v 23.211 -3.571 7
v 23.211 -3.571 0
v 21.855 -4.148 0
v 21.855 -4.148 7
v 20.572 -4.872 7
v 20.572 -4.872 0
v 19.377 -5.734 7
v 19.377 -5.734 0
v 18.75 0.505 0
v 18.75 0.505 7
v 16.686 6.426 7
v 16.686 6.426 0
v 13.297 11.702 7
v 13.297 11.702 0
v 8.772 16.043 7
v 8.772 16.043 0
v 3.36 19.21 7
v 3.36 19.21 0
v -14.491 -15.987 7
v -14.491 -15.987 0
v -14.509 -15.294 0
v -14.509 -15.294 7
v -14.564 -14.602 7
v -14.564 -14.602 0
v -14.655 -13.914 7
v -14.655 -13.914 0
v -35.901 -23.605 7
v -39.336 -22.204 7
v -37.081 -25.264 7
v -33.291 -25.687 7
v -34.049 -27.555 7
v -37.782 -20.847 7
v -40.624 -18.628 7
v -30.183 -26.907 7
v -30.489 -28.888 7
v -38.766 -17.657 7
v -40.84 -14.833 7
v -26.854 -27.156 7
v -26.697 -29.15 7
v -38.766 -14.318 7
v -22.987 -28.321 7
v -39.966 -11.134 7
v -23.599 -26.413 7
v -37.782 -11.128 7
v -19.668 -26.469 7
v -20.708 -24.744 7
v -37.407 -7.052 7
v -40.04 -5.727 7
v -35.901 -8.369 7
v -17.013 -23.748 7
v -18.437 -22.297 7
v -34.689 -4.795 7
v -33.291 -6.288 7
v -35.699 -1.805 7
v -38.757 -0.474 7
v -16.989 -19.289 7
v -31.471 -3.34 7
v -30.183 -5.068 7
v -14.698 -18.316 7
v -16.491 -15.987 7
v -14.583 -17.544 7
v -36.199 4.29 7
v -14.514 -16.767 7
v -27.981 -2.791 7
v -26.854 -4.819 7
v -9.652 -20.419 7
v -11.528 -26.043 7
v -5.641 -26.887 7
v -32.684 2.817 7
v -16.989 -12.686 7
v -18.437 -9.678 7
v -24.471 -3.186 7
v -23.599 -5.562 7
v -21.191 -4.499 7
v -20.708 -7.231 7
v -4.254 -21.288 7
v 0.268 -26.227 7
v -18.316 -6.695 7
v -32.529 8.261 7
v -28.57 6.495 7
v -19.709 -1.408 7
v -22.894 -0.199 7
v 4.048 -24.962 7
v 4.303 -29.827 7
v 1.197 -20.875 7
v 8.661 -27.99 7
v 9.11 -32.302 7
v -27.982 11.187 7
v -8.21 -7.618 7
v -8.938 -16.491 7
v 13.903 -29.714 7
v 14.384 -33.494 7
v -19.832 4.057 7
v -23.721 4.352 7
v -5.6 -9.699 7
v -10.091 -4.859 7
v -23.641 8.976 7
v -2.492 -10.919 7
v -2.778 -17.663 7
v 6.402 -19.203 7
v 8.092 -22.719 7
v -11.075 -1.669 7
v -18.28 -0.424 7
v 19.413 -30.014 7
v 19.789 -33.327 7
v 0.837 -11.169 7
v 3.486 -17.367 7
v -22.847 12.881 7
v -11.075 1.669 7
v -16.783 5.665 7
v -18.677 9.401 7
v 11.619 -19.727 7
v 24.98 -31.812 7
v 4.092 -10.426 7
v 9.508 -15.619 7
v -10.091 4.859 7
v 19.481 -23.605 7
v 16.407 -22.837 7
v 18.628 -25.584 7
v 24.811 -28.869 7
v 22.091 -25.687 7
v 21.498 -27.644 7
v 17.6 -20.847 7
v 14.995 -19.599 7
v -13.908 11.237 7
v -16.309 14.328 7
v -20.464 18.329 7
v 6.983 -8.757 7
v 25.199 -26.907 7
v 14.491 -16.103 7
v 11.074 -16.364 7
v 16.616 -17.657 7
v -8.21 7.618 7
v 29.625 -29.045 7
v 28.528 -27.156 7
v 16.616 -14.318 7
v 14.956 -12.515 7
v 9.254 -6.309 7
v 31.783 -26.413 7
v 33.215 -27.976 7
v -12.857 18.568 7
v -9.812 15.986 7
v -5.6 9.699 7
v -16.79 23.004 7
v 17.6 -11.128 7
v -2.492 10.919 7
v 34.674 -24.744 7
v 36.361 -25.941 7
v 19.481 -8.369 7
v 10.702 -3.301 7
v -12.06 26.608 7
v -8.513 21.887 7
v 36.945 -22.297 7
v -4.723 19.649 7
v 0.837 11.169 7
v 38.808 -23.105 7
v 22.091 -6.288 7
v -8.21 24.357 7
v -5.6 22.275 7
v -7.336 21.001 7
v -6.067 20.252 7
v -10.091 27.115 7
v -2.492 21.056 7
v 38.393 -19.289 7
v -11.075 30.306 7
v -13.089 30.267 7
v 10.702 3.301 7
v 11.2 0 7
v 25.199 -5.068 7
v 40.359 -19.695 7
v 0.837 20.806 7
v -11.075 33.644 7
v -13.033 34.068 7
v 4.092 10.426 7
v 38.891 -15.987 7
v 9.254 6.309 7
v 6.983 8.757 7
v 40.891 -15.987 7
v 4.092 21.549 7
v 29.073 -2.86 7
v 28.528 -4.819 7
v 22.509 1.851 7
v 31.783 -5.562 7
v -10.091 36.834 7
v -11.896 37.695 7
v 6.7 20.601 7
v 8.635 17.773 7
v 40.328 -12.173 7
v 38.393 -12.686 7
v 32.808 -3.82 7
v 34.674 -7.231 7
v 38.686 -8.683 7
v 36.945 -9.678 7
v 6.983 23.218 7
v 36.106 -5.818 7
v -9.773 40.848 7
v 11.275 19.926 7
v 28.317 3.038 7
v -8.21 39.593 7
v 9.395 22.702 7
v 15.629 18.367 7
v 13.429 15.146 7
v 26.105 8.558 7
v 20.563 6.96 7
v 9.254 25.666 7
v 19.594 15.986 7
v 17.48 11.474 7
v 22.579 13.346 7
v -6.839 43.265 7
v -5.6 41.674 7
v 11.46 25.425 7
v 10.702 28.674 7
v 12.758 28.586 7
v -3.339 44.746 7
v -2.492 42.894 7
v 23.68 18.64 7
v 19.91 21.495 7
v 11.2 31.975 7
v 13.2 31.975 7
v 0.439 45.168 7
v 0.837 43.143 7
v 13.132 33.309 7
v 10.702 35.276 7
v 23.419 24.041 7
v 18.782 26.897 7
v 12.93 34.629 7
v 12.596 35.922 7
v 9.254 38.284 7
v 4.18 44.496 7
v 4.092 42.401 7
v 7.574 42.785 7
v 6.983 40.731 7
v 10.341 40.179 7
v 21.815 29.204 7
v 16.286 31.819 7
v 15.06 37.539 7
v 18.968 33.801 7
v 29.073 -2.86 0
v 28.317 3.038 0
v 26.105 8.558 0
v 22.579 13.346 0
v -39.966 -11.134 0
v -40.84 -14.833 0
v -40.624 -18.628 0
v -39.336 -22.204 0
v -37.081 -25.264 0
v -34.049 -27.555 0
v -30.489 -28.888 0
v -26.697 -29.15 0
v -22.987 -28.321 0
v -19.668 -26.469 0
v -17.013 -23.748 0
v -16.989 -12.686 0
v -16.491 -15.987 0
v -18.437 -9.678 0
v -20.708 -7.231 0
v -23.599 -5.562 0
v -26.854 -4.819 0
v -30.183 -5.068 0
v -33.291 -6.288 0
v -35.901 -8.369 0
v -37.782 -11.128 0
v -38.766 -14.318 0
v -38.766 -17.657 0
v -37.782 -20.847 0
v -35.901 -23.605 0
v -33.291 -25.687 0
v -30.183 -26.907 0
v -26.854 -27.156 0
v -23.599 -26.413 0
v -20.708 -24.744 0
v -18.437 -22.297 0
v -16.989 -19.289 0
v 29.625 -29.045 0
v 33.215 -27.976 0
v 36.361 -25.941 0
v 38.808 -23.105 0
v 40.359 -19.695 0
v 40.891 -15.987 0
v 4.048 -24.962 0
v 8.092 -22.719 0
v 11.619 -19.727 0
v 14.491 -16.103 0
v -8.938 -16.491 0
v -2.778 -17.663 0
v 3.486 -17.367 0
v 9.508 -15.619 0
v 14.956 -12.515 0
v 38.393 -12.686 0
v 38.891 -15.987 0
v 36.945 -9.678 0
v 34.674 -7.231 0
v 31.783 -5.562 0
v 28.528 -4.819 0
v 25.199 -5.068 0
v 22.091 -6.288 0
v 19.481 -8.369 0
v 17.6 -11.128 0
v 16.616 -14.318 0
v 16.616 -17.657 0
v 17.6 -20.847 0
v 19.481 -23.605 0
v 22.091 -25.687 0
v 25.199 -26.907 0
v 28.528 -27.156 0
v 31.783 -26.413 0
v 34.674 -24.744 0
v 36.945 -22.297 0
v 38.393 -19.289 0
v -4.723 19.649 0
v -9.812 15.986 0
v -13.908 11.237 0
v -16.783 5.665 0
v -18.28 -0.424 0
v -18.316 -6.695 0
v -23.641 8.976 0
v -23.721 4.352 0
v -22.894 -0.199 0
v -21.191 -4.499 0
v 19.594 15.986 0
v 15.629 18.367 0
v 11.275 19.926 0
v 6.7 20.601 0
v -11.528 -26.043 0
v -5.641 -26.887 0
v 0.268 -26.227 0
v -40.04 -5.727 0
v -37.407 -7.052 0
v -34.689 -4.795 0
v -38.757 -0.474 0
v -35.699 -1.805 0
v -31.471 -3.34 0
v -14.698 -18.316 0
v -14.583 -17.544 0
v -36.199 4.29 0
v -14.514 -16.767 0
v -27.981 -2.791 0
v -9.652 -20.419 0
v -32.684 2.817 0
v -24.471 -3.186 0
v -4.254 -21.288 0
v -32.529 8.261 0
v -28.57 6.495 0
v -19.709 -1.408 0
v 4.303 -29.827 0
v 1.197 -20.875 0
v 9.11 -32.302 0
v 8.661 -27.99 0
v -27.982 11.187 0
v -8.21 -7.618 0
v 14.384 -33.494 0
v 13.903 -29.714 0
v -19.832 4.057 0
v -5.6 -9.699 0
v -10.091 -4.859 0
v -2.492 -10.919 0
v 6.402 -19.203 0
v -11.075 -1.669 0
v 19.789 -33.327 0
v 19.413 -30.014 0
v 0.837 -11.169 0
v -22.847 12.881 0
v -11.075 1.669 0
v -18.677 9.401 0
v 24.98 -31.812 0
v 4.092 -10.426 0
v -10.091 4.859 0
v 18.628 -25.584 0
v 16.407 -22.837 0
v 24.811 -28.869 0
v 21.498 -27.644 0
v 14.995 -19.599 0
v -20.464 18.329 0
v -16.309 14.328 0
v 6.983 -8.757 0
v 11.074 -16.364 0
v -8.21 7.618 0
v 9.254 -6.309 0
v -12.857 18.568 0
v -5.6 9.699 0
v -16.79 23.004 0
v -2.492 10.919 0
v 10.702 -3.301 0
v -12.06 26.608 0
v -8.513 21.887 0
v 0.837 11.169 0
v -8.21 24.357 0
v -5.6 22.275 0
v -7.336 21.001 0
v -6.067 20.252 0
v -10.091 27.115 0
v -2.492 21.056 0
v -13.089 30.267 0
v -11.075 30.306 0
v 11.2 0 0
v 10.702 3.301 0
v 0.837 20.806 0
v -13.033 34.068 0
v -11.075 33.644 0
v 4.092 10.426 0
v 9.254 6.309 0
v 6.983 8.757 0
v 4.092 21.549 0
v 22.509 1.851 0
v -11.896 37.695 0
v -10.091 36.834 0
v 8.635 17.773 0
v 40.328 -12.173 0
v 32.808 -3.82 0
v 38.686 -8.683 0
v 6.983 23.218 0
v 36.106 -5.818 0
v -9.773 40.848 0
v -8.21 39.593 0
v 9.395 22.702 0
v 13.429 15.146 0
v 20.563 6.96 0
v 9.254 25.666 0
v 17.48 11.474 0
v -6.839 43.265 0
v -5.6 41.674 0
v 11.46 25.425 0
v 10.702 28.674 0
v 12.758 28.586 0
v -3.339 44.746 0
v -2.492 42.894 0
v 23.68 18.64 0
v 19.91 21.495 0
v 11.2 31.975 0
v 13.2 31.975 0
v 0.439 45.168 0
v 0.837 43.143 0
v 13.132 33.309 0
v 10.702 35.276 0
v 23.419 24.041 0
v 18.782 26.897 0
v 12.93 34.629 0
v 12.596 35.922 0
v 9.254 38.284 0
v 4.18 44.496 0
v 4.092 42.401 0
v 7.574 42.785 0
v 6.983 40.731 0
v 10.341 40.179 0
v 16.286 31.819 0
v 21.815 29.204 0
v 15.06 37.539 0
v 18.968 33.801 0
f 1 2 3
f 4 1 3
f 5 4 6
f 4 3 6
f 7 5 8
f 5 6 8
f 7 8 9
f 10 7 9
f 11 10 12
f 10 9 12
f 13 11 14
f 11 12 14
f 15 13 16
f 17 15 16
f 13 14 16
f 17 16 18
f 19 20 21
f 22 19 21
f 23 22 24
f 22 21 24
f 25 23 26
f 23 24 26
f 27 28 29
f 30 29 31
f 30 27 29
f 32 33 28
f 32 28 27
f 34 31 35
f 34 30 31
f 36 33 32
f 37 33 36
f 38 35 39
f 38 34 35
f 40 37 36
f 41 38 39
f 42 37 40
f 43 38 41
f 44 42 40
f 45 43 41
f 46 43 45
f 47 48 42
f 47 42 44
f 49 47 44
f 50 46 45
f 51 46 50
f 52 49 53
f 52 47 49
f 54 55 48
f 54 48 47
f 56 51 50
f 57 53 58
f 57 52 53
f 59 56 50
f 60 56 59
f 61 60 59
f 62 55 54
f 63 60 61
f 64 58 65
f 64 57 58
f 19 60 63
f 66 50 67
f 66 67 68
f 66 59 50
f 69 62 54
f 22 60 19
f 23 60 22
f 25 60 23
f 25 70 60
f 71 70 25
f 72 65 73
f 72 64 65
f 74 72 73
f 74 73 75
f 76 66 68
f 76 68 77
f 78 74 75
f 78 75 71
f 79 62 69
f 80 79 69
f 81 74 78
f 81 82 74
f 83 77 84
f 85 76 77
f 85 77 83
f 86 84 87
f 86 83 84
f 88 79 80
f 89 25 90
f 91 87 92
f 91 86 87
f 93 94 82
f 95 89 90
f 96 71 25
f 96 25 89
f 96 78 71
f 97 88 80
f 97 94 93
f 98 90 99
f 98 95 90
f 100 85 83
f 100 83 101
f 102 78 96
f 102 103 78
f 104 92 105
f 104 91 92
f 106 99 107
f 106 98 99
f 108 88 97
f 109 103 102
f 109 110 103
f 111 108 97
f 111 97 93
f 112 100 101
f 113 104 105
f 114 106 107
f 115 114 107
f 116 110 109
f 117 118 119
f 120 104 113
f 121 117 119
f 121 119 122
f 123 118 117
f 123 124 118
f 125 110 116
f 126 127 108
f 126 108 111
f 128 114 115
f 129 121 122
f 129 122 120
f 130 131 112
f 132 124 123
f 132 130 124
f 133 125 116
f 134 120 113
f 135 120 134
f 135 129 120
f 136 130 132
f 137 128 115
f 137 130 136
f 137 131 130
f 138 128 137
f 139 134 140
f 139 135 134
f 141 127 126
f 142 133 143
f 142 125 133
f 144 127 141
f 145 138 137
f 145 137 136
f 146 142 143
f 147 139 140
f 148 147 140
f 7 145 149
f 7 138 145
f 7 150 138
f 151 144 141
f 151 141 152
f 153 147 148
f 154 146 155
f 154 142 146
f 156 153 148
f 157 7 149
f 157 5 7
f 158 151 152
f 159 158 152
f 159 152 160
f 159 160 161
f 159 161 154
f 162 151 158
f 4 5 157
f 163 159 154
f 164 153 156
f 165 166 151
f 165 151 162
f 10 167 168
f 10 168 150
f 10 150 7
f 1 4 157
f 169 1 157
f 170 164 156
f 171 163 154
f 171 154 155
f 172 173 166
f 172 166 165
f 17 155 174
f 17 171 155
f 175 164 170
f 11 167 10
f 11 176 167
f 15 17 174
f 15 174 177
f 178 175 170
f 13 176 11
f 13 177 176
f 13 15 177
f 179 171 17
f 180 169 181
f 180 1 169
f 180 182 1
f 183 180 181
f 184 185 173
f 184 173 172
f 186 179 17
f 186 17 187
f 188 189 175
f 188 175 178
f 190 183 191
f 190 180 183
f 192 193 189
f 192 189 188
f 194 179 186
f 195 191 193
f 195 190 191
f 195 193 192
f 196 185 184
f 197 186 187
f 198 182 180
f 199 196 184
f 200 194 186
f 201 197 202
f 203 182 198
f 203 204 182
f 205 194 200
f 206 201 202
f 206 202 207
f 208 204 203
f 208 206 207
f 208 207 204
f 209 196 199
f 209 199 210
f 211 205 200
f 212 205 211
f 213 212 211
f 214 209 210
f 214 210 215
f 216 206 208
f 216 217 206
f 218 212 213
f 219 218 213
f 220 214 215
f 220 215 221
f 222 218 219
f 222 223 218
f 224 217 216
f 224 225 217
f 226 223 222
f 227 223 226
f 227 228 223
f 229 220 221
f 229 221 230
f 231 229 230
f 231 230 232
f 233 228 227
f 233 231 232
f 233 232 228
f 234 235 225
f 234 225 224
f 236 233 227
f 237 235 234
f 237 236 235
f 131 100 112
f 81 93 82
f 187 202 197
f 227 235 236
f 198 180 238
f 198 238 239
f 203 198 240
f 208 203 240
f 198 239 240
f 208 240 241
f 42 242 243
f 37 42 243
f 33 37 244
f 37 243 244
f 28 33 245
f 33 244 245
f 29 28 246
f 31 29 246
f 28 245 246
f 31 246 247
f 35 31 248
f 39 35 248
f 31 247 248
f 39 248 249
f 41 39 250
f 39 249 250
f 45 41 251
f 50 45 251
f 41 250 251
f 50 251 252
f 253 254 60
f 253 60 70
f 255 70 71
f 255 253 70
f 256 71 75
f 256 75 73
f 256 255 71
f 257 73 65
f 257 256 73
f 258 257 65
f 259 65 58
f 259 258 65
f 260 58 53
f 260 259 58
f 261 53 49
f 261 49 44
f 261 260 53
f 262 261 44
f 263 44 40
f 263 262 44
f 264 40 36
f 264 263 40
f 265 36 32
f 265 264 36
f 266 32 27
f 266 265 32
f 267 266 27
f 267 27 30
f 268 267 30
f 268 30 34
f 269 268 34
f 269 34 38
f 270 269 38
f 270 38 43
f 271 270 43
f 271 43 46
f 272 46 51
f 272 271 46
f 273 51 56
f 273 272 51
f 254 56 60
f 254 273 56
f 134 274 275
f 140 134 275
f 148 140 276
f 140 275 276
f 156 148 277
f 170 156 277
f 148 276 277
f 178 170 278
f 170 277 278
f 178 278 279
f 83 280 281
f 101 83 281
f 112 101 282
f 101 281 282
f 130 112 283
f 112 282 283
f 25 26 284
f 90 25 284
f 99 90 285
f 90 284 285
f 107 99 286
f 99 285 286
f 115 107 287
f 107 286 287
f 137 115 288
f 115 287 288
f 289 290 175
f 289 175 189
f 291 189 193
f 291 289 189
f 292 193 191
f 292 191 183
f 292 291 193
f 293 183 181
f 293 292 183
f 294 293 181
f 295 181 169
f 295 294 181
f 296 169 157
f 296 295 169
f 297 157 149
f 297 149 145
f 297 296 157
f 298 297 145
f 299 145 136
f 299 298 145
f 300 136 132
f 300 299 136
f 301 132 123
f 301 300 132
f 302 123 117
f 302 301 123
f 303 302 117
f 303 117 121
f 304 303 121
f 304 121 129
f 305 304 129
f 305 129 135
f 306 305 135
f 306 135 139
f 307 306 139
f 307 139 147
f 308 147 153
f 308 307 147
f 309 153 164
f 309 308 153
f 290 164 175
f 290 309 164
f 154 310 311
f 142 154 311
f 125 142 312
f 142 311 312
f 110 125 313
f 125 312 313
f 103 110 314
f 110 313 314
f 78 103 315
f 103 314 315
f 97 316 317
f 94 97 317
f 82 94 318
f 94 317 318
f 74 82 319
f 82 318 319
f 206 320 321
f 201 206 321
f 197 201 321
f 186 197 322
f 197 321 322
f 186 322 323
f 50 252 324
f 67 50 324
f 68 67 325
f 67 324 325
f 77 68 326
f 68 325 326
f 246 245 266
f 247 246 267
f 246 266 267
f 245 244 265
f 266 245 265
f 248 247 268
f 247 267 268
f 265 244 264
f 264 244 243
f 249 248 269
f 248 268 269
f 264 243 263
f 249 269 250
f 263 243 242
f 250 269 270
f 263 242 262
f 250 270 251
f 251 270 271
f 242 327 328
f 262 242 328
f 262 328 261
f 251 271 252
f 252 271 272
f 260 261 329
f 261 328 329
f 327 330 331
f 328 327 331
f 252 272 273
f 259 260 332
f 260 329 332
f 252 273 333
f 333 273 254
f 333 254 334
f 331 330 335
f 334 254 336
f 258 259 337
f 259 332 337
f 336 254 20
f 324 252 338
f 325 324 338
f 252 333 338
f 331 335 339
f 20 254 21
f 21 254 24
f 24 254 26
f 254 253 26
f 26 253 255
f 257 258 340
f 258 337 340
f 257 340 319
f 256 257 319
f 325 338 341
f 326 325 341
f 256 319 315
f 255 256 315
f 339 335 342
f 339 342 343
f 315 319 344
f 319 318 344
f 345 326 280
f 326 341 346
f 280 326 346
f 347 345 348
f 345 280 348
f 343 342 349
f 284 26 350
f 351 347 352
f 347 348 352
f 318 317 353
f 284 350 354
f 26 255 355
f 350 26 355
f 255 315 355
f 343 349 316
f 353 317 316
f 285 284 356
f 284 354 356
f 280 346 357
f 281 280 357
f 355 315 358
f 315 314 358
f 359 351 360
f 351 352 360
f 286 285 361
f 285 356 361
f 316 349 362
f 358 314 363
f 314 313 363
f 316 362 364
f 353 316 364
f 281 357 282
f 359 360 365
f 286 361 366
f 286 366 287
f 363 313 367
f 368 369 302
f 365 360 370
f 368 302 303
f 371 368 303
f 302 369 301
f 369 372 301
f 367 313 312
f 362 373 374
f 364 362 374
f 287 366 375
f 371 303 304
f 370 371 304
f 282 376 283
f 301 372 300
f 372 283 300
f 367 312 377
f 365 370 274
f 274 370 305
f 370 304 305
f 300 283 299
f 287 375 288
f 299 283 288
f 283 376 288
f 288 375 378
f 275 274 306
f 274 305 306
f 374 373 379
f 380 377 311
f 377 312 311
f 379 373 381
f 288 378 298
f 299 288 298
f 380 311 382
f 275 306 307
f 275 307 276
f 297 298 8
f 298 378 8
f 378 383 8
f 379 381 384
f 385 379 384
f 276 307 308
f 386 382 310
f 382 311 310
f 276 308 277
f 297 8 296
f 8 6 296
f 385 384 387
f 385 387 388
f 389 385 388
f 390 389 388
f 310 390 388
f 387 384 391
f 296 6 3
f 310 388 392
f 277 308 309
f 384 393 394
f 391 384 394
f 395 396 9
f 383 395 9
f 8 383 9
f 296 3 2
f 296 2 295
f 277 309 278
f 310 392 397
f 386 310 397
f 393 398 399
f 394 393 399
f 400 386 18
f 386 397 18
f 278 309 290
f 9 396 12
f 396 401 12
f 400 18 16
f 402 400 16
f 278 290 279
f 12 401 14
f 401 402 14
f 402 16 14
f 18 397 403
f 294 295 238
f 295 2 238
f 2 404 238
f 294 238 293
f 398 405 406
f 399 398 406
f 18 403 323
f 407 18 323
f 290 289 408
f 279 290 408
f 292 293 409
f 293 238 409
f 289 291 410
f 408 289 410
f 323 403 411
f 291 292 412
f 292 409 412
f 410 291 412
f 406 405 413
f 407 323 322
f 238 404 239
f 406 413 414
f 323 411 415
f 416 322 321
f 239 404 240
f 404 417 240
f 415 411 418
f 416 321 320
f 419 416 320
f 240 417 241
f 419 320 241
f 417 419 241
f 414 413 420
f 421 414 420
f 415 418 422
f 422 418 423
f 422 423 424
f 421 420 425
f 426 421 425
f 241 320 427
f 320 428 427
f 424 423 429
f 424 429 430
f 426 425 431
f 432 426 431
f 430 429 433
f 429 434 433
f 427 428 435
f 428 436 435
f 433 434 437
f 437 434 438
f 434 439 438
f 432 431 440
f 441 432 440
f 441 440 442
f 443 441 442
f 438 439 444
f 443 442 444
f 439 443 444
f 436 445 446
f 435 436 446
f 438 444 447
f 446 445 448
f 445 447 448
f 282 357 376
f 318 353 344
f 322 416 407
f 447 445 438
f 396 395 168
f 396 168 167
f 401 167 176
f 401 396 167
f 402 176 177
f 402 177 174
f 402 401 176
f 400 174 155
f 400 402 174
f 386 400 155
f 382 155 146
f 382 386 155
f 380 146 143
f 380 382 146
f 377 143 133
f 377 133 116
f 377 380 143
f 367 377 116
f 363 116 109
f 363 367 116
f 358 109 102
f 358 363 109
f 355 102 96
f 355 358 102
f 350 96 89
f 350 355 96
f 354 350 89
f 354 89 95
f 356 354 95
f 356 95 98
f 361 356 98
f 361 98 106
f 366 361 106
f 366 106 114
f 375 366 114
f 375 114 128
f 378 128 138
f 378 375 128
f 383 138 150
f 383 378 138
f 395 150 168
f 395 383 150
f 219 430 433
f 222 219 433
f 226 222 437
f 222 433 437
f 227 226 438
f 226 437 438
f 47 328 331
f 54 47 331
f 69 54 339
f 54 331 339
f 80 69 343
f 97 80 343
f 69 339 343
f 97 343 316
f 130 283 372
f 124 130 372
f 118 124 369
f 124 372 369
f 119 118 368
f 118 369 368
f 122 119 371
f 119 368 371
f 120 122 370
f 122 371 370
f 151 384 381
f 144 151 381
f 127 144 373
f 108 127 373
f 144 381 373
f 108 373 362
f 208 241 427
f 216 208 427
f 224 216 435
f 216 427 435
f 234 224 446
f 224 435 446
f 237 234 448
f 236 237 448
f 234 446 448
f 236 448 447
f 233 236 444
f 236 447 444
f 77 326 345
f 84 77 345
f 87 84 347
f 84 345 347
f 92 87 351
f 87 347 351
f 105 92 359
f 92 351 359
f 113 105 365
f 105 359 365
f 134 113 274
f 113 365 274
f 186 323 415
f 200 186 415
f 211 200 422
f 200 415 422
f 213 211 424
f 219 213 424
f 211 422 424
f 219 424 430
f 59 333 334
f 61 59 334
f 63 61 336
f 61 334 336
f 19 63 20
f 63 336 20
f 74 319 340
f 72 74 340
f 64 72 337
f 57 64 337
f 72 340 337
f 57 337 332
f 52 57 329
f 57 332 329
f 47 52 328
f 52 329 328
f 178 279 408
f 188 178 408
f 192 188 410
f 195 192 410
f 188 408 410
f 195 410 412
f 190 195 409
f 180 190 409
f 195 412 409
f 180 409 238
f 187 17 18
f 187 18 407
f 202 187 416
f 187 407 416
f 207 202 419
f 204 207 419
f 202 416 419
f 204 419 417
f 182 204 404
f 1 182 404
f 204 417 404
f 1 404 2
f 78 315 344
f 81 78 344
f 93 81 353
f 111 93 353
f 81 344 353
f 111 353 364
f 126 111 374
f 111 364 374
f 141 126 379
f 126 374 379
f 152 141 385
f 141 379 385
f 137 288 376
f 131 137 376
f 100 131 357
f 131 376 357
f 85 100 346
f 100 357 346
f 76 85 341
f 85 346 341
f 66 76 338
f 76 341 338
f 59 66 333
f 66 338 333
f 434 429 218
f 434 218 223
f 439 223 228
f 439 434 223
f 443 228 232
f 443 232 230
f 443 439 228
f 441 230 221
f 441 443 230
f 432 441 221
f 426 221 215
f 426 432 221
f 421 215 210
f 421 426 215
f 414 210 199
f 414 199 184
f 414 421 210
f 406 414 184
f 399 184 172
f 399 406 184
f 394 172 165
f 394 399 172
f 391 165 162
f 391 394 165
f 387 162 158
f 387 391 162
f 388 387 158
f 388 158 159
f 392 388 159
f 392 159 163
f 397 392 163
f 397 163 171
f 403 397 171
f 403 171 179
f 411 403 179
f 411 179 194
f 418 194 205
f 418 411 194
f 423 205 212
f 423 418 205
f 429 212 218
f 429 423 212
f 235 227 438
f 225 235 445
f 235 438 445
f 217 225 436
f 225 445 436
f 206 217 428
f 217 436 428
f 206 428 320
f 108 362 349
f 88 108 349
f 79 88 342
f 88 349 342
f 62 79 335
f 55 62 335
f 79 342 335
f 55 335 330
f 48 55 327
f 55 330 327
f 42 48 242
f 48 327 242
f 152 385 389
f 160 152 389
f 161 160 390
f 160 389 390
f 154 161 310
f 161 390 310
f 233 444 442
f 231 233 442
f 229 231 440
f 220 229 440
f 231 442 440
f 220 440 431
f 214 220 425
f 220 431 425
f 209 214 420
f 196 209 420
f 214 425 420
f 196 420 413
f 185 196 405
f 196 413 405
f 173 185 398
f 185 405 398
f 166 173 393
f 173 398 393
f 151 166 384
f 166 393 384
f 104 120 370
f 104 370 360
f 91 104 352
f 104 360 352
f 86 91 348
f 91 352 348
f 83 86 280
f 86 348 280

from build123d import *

# Parameters (mm, degrees)
F0_R     = 11.2
F0_R_2   = 13.2
F1_DEPTH = 7


with BuildPart() as f1:
    # F0 (on Top) → F1 (new body)
    with BuildSketch(Plane.XY):
        with BuildLine():
            ThreePointArc((6.699736, 20.60143), (11.46029, 25.424858), (13.2, 31.9748))
            ThreePointArc((13.2, 31.9748), (13.048167, 33.971132), (12.59616, 35.921539))
            ThreePointArc((12.59616, 35.921539), (11.664432, 38.15388), (10.34098, 40.17871))
            ThreePointArc((10.34098, 40.17871), (-6.83944, 43.26471), (-12.059859, 26.608256))
            ThreePointArc((-12.059859, 26.608256), (-10.553777, 24.046509), (-8.512807, 21.886583))
            ThreePointArc((-8.512807, 21.886583), (-6.711654, 20.60846), (-4.722613, 19.64853))
            ThreePointArc((-4.722613, 19.64853), (-0.715754, 18.79422), (3.360055, 19.209612))
            ThreePointArc((3.360055, 19.209612), (5.077808, 19.790553), (6.699736, 20.60143))
        make_face()
        with Locations((0, 31.9748)):
            Circle(F0_R, mode=Mode.SUBTRACT)
        with BuildLine():
            ThreePointArc((10.34098, 40.17871), (11.664432, 38.15388), (12.59616, 35.921539))
            ThreePointArc((12.59616, 35.921539), (18.781531, 26.896904), (19.593705, 15.986211))
            ThreePointArc((19.593705, 15.986211), (21.142377, 14.729254), (22.578902, 13.345517))
            ThreePointArc((22.578902, 13.345517), (21.814507, 29.204192), (10.34098, 40.17871))
        make_face()
        with BuildLine():
            ThreePointArc((19.593705, 15.986211), (13.490319, 19.253765), (6.699736, 20.60143))
            ThreePointArc((6.699736, 20.60143), (5.077808, 19.790553), (3.360055, 19.209612))
            ThreePointArc((3.360055, 19.209612), (17.479874, 11.47432), (23.21074, -3.570985))
            ThreePointArc((23.21074, -3.570985), (26.101776, -2.883416), (29.073356, -2.859984))
            ThreePointArc((29.073356, -2.859984), (27.386598, 5.868135), (22.578902, 13.345517))
            ThreePointArc((22.578902, 13.345517), (21.142377, 14.729254), (19.593705, 15.986211))
        make_face()
        with BuildLine():
            ThreePointArc((-8.512807, 21.886583), (-10.553777, 24.046509), (-12.059859, 26.608256))
            ThreePointArc((-12.059859, 26.608256), (-18.775253, 20.783423), (-22.847008, 12.881144))
            ThreePointArc((-22.847008, 12.881144), (-23.327096, 10.945209), (-23.641317, 8.97554))
            ThreePointArc((-23.641317, 8.97554), (-23.419409, 2.056076), (-21.191229, -4.498574))
            ThreePointArc((-21.191229, -4.498574), (-19.678026, -5.497766), (-18.316039, -6.694913))
            ThreePointArc((-18.316039, -6.694913), (-18.67699, 9.400855), (-8.512807, 21.886583))
        make_face()
        with BuildLine():
            ThreePointArc((23.21074, -3.570985), (21.203277, -4.491767), (19.377433, -5.734362))
            ThreePointArc((19.377433, -5.734362), (16.634148, -8.777249), (14.955984, -12.514699))
            ThreePointArc((14.955984, -12.514699), (14.600218, -14.292788), (14.491494, -16.102856))
            ThreePointArc((14.491494, -16.102856), (17.425303, -24.285333), (24.810885, -28.869364))
            ThreePointArc((24.810885, -28.869364), (27.210013, -29.178634), (29.625294, -29.044906))
            ThreePointArc((29.625294, -29.044906), (37.685308, -24.610253), (40.890989, -15.9874))
            ThreePointArc((40.890989, -15.9874), (37.501372, -7.155844), (29.073356, -2.859984))
            ThreePointArc((29.073356, -2.859984), (26.101776, -2.883416), (23.21074, -3.570985))
        make_face()
        with Locations((27.690989, -15.9874)):
            Circle(F0_R, mode=Mode.SUBTRACT)
        with BuildLine():
            ThreePointArc((-23.641317, 8.97554), (-23.327096, 10.945209), (-22.847008, 12.881144))
            ThreePointArc((-22.847008, 12.881144), (-36.198826, 4.289821), (-39.966273, -11.133804))
            ThreePointArc((-39.966273, -11.133804), (-38.874445, -8.975245), (-37.407045, -7.052174))
            ThreePointArc((-37.407045, -7.052174), (-32.684167, 2.816831), (-23.641317, 8.97554))
        make_face()
        with BuildLine():
            ThreePointArc((-14.65482, -13.914168), (-15.918395, -10.016971), (-18.316039, -6.694913))
            ThreePointArc((-18.316039, -6.694913), (-19.678026, -5.497766), (-21.191229, -4.498574))
            ThreePointArc((-21.191229, -4.498574), (-29.744367, -2.948089), (-37.407045, -7.052174))
            ThreePointArc((-37.407045, -7.052174), (-38.874445, -8.975245), (-39.966273, -11.133804))
            ThreePointArc((-39.966273, -11.133804), (-34.048618, -27.555484), (-17.013496, -23.748273))
            ThreePointArc((-17.013496, -23.748273), (-15.547999, -21.163093), (-14.697934, -18.315599))
            ThreePointArc((-14.697934, -18.315599), (-14.542827, -17.156089), (-14.490989, -15.9874))
            ThreePointArc((-14.490989, -15.9874), (-14.53201, -14.947552), (-14.65482, -13.914168))
        make_face()
        with Locations((-27.690989, -15.9874)):
            Circle(F0_R, mode=Mode.SUBTRACT)
        with BuildLine():
            ThreePointArc((14.491494, -16.102856), (14.600218, -14.292788), (14.955984, -12.514699))
            ThreePointArc((14.955984, -12.514699), (1.197116, -20.875175), (-14.697934, -18.315599))
            ThreePointArc((-14.697934, -18.315599), (-15.547999, -21.163093), (-17.013496, -23.748273))
            ThreePointArc((-17.013496, -23.748273), (-8.611345, -26.651557), (0.268106, -26.226661))
            ThreePointArc((0.268106, -26.226661), (2.184719, -25.674462), (4.047613, -24.961751))
            ThreePointArc((4.047613, -24.961751), (9.92909, -21.309841), (14.491494, -16.102856))
        make_face()
        with BuildLine():
            ThreePointArc((0.268106, -26.226661), (14.384319, -33.494013), (29.625294, -29.044906))
            ThreePointArc((29.625294, -29.044906), (27.210013, -29.178634), (24.810885, -28.869364))
            ThreePointArc((24.810885, -28.869364), (13.902636, -29.713735), (4.047613, -24.961751))
            ThreePointArc((4.047613, -24.961751), (2.184719, -25.674462), (0.268106, -26.226661))
        make_face()
        with BuildLine():
            ThreePointArc((19.377433, -5.734362), (15.146889, 9.163701), (3.360055, 19.209612))
            ThreePointArc((3.360055, 19.209612), (-0.715754, 18.79422), (-4.722613, 19.64853))
            ThreePointArc((-4.722613, 19.64853), (-15.509442, 8.535741), (-18.316039, -6.694913))
            ThreePointArc((-18.316039, -6.694913), (-15.918395, -10.016971), (-14.65482, -13.914168))
            ThreePointArc((-14.65482, -13.914168), (0.362553, -17.699441), (14.955984, -12.514699))
            ThreePointArc((14.955984, -12.514699), (16.634148, -8.777249), (19.377433, -5.734362))
        make_face()
        Circle(F0_R_2, mode=Mode.SUBTRACT)
        Circle(F0_R_2)
        Circle(F0_R, mode=Mode.SUBTRACT)
    extrude(amount=F1_DEPTH)


solid = f1.part
